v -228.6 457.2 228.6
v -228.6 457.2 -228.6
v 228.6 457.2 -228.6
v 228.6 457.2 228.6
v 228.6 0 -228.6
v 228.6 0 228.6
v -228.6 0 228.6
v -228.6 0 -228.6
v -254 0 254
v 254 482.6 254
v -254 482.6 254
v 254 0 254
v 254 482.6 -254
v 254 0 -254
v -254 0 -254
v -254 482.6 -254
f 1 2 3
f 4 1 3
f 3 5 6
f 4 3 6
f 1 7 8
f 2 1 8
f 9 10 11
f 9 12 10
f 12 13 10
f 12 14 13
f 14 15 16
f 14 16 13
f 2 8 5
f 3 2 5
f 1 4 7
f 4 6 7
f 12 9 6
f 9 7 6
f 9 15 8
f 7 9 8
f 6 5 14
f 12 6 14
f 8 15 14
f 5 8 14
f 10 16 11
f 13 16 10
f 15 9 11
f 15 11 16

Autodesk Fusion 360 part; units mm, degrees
sketch "Sketch1" plane through (0, 0, 0) normal (0, 1, 0) x (1, 0, 0)
  line L0 (228.6, -228.6) -> (-228.6, -228.6)
  line L1 (-228.6, -228.6) -> (-228.6, 228.6)
  line L2 (-228.6, 228.6) -> (228.6, 228.6)
  line L3 (228.6, 228.6) -> (228.6, -228.6)
  line L4 (228.6, -228.6) -> (-228.6, 228.6) construction
  line L5 (-228.6, -228.6) -> (228.6, 228.6) construction
  dimension "d1" = 457.2
  dimension "d2" = 457.2
extrude "Extrude1" add sketch "Sketch1" along normal blind 457.2 makes body 1
copy_body "Body->Comp1" bodies 1 removing the originals makes body 2 in component "SIzing Box"
delete_body "RemoveBody1" bodies 2 in component "SIzing Box"
sketch "Sketch1 (2)" plane through (0, 0, 0) normal (0, 1, 0) x (1, 0, 0) in component "SIzing Box"
  line L0 (228.6, -228.6) -> (-228.6, -228.6)
  line L1 (-228.6, -228.6) -> (-228.6, 228.6)
  line L2 (-228.6, 228.6) -> (228.6, 228.6)
  line L3 (228.6, 228.6) -> (228.6, -228.6)
  line L4 (228.6, -228.6) -> (-228.6, 228.6) construction
  line L5 (-228.6, -228.6) -> (228.6, 228.6) construction
  line L6 (254, -254) -> (-254, -254)
  line L7 (-254, -254) -> (-254, 254)
  line L8 (-254, 254) -> (254, 254)
  line L9 (254, 254) -> (254, -254)
  dimension "d5" = 457.2
  dimension "d6" = 457.2
  dimension "d7" = -25.4
extrude "Extrude2" add sketch "Sketch1 (2)" along normal blind 25.4 from surface at 457.2 separate body contours L0 L1 L2 L3 | L6 L7 L8 L9 makes body 3 in component "SIzing Box"
extrude "Extrude1'" add sketch "Sketch1 (2)" along normal blind 457.2 bodies 3 in component "SIzing Box"
component "SIzing Box" placed x (1, 0, 0) y (0, 1, 0) z (0, 0, 1) at (0, 0, 0)
